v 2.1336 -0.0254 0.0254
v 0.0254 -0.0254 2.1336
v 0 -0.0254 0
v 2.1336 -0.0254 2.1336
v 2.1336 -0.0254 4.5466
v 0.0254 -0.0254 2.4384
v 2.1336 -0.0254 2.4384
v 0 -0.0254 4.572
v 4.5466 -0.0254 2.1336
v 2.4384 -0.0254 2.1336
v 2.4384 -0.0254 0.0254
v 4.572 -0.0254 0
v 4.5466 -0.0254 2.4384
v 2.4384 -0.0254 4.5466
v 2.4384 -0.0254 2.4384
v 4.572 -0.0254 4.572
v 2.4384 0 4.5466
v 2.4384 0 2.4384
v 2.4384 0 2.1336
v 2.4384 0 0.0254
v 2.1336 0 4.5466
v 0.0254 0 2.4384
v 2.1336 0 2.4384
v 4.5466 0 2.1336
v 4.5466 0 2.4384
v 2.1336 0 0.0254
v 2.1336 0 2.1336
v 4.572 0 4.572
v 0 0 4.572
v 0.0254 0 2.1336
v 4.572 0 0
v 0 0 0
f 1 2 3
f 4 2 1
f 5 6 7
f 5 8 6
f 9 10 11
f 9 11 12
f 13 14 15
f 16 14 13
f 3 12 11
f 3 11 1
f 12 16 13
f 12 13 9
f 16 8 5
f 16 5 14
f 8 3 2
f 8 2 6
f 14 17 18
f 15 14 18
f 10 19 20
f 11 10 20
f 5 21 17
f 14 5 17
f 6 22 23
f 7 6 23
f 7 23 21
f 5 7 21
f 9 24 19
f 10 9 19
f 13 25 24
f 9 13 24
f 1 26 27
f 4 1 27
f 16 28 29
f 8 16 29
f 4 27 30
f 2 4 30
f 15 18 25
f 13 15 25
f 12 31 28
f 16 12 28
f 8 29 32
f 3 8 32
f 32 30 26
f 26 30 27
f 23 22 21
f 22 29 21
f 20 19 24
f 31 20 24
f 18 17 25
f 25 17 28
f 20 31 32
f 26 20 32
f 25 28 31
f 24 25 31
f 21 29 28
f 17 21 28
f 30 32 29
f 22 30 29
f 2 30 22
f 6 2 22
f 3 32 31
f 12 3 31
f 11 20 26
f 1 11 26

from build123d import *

# Parameters (mm, degrees)
F0_W     = 0.1524
F0_H     = 0.0254
F0_W_2   = 0.0254
F0_H_2   = 0.1524
F1_DEPTH = 0.0254


with BuildPart() as f1:
    # F0 (on Front) → F1 (new body)
    with BuildSketch(Plane.XZ):
        Polygon((0, 2.1336), (0, 0), (2.1336, 0), (2.1336, 0.0254), (2.1336, 2.1336), (0.0254, 2.1336), align=None)
        with Locations((2.2098, 0.0127)):
            Rectangle(F0_W, F0_H)
        with Locations((0.0127, 2.2098)):
            Rectangle(F0_W_2, F0_H_2)
        with Locations((2.3622, 0.0127)):
            Rectangle(F0_W, F0_H)
        with Locations((0.0127, 2.3622)):
            Rectangle(F0_W_2, F0_H_2)
        Polygon((2.4384, 0.0254), (2.4384, 0), (4.572, 0), (4.572, 2.1336), (4.5466, 2.1336), (2.4384, 2.1336), align=None)
        Polygon((0, 4.572), (0, 2.4384), (0.0254, 2.4384), (2.1336, 2.4384), (2.1336, 4.5466), (2.1336, 4.572), align=None)
        with Locations((4.5593, 2.2098)):
            Rectangle(F0_W_2, F0_H_2)
        Polygon((2.267986, 4.572), (2.1336, 4.572), (2.1336, 4.5466), (2.286, 4.5466), (2.286, 4.572), (2.278709, 4.572), align=None)
        with Locations((4.5593, 2.3622)):
            Rectangle(F0_W_2, F0_H_2)
        Polygon((4.5466, 2.4384), (4.572, 2.4384), (4.572, 4.572), (2.4384, 4.572), (2.4384, 4.5466), (2.4384, 4.528079), (2.4384, 2.4384), align=None)
        Polygon((2.286, 4.572), (2.286, 4.5466), (2.4384, 4.5466), (2.4384, 4.572), (2.316148, 4.572), align=None)
    extrude(amount=F1_DEPTH)


solid = f1.part
